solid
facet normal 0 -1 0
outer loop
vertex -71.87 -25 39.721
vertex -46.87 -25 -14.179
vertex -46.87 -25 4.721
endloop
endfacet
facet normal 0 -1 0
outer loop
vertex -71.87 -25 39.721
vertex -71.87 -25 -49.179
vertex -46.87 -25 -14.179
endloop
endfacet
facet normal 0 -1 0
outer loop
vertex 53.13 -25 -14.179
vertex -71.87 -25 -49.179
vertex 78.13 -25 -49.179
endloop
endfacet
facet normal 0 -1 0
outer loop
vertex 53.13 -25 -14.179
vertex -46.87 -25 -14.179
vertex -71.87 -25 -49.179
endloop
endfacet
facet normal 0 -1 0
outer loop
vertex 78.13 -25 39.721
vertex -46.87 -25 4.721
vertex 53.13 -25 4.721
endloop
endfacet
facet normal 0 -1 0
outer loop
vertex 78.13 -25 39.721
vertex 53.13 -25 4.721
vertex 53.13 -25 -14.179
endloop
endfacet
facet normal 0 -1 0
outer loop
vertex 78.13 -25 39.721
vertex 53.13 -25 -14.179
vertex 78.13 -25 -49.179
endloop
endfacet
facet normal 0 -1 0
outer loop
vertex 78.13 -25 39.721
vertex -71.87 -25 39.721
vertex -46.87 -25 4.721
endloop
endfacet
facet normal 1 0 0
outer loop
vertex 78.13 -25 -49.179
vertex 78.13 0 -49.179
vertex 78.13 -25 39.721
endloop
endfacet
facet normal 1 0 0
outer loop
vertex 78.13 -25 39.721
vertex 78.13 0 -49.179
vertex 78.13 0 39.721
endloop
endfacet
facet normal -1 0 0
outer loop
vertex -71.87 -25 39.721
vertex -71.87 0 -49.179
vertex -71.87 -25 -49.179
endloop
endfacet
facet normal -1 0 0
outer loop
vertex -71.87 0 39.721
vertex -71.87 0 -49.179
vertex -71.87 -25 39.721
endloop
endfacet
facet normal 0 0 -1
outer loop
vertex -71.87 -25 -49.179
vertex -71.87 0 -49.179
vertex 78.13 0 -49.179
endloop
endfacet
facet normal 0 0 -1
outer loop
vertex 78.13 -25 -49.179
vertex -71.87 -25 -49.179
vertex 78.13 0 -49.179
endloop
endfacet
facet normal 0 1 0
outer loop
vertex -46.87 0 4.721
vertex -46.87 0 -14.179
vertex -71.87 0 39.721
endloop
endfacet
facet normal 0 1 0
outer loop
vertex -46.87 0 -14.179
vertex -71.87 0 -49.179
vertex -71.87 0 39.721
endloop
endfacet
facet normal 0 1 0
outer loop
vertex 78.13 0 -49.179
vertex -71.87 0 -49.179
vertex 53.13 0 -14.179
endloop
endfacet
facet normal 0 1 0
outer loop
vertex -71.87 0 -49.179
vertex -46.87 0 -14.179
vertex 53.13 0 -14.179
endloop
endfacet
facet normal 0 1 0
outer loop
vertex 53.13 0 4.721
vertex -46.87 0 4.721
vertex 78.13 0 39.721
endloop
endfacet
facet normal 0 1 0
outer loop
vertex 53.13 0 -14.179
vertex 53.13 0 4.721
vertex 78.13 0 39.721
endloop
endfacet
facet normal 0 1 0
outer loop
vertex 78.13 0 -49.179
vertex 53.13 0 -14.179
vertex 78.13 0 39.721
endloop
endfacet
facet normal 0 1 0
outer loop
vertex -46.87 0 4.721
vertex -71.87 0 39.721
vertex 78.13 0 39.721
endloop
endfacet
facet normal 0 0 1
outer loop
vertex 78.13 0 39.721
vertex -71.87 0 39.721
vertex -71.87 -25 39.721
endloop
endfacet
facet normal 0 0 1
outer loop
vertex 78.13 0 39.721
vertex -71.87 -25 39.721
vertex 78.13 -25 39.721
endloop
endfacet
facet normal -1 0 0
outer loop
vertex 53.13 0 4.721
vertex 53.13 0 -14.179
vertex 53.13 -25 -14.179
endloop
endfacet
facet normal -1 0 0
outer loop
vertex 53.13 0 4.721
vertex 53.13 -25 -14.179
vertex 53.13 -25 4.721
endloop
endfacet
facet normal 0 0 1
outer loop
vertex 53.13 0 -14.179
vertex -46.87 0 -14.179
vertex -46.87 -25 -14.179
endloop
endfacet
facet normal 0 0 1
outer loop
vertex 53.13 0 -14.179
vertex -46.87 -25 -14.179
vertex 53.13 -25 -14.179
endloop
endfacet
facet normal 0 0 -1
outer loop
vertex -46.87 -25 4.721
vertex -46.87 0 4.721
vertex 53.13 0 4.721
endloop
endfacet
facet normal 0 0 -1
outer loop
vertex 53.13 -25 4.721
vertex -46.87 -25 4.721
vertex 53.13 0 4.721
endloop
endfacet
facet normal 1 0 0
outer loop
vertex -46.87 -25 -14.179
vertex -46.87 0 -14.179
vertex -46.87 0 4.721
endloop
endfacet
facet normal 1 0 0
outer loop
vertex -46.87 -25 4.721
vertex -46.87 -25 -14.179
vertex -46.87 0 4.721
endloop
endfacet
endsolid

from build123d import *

# Parameters (mm, degrees)
F0_W     = 150
F0_H     = 88.9
F0_W_2   = 100
F0_H_2   = 18.9
F1_DEPTH = 25
F2_DEPTH = 190


# Not quite as in the source:
# - an extrude ends at something that could not be found from the text; its depth is read off the source's solid


with BuildPart() as f1:
    # F0 (on Front) → F1 (new body)
    with BuildSketch(Plane.XZ):
        with Locations((3.1299684197, -4.7291009414)):
            Rectangle(F0_W, F0_H)
        with Locations((3.1299684197, -4.7291009414)):
            Rectangle(F0_W_2, F0_H_2, mode=Mode.SUBTRACT)
    extrude(amount=F1_DEPTH)

    # F0 (on Front) → F2 (cut, through all)
    with BuildSketch(Plane.XZ):
        with Locations((3.1299684197, -4.7291009414)):
            Rectangle(F0_W_2, F0_H_2)
    extrude(amount=-F2_DEPTH, mode=Mode.SUBTRACT)


solid = f1.part
